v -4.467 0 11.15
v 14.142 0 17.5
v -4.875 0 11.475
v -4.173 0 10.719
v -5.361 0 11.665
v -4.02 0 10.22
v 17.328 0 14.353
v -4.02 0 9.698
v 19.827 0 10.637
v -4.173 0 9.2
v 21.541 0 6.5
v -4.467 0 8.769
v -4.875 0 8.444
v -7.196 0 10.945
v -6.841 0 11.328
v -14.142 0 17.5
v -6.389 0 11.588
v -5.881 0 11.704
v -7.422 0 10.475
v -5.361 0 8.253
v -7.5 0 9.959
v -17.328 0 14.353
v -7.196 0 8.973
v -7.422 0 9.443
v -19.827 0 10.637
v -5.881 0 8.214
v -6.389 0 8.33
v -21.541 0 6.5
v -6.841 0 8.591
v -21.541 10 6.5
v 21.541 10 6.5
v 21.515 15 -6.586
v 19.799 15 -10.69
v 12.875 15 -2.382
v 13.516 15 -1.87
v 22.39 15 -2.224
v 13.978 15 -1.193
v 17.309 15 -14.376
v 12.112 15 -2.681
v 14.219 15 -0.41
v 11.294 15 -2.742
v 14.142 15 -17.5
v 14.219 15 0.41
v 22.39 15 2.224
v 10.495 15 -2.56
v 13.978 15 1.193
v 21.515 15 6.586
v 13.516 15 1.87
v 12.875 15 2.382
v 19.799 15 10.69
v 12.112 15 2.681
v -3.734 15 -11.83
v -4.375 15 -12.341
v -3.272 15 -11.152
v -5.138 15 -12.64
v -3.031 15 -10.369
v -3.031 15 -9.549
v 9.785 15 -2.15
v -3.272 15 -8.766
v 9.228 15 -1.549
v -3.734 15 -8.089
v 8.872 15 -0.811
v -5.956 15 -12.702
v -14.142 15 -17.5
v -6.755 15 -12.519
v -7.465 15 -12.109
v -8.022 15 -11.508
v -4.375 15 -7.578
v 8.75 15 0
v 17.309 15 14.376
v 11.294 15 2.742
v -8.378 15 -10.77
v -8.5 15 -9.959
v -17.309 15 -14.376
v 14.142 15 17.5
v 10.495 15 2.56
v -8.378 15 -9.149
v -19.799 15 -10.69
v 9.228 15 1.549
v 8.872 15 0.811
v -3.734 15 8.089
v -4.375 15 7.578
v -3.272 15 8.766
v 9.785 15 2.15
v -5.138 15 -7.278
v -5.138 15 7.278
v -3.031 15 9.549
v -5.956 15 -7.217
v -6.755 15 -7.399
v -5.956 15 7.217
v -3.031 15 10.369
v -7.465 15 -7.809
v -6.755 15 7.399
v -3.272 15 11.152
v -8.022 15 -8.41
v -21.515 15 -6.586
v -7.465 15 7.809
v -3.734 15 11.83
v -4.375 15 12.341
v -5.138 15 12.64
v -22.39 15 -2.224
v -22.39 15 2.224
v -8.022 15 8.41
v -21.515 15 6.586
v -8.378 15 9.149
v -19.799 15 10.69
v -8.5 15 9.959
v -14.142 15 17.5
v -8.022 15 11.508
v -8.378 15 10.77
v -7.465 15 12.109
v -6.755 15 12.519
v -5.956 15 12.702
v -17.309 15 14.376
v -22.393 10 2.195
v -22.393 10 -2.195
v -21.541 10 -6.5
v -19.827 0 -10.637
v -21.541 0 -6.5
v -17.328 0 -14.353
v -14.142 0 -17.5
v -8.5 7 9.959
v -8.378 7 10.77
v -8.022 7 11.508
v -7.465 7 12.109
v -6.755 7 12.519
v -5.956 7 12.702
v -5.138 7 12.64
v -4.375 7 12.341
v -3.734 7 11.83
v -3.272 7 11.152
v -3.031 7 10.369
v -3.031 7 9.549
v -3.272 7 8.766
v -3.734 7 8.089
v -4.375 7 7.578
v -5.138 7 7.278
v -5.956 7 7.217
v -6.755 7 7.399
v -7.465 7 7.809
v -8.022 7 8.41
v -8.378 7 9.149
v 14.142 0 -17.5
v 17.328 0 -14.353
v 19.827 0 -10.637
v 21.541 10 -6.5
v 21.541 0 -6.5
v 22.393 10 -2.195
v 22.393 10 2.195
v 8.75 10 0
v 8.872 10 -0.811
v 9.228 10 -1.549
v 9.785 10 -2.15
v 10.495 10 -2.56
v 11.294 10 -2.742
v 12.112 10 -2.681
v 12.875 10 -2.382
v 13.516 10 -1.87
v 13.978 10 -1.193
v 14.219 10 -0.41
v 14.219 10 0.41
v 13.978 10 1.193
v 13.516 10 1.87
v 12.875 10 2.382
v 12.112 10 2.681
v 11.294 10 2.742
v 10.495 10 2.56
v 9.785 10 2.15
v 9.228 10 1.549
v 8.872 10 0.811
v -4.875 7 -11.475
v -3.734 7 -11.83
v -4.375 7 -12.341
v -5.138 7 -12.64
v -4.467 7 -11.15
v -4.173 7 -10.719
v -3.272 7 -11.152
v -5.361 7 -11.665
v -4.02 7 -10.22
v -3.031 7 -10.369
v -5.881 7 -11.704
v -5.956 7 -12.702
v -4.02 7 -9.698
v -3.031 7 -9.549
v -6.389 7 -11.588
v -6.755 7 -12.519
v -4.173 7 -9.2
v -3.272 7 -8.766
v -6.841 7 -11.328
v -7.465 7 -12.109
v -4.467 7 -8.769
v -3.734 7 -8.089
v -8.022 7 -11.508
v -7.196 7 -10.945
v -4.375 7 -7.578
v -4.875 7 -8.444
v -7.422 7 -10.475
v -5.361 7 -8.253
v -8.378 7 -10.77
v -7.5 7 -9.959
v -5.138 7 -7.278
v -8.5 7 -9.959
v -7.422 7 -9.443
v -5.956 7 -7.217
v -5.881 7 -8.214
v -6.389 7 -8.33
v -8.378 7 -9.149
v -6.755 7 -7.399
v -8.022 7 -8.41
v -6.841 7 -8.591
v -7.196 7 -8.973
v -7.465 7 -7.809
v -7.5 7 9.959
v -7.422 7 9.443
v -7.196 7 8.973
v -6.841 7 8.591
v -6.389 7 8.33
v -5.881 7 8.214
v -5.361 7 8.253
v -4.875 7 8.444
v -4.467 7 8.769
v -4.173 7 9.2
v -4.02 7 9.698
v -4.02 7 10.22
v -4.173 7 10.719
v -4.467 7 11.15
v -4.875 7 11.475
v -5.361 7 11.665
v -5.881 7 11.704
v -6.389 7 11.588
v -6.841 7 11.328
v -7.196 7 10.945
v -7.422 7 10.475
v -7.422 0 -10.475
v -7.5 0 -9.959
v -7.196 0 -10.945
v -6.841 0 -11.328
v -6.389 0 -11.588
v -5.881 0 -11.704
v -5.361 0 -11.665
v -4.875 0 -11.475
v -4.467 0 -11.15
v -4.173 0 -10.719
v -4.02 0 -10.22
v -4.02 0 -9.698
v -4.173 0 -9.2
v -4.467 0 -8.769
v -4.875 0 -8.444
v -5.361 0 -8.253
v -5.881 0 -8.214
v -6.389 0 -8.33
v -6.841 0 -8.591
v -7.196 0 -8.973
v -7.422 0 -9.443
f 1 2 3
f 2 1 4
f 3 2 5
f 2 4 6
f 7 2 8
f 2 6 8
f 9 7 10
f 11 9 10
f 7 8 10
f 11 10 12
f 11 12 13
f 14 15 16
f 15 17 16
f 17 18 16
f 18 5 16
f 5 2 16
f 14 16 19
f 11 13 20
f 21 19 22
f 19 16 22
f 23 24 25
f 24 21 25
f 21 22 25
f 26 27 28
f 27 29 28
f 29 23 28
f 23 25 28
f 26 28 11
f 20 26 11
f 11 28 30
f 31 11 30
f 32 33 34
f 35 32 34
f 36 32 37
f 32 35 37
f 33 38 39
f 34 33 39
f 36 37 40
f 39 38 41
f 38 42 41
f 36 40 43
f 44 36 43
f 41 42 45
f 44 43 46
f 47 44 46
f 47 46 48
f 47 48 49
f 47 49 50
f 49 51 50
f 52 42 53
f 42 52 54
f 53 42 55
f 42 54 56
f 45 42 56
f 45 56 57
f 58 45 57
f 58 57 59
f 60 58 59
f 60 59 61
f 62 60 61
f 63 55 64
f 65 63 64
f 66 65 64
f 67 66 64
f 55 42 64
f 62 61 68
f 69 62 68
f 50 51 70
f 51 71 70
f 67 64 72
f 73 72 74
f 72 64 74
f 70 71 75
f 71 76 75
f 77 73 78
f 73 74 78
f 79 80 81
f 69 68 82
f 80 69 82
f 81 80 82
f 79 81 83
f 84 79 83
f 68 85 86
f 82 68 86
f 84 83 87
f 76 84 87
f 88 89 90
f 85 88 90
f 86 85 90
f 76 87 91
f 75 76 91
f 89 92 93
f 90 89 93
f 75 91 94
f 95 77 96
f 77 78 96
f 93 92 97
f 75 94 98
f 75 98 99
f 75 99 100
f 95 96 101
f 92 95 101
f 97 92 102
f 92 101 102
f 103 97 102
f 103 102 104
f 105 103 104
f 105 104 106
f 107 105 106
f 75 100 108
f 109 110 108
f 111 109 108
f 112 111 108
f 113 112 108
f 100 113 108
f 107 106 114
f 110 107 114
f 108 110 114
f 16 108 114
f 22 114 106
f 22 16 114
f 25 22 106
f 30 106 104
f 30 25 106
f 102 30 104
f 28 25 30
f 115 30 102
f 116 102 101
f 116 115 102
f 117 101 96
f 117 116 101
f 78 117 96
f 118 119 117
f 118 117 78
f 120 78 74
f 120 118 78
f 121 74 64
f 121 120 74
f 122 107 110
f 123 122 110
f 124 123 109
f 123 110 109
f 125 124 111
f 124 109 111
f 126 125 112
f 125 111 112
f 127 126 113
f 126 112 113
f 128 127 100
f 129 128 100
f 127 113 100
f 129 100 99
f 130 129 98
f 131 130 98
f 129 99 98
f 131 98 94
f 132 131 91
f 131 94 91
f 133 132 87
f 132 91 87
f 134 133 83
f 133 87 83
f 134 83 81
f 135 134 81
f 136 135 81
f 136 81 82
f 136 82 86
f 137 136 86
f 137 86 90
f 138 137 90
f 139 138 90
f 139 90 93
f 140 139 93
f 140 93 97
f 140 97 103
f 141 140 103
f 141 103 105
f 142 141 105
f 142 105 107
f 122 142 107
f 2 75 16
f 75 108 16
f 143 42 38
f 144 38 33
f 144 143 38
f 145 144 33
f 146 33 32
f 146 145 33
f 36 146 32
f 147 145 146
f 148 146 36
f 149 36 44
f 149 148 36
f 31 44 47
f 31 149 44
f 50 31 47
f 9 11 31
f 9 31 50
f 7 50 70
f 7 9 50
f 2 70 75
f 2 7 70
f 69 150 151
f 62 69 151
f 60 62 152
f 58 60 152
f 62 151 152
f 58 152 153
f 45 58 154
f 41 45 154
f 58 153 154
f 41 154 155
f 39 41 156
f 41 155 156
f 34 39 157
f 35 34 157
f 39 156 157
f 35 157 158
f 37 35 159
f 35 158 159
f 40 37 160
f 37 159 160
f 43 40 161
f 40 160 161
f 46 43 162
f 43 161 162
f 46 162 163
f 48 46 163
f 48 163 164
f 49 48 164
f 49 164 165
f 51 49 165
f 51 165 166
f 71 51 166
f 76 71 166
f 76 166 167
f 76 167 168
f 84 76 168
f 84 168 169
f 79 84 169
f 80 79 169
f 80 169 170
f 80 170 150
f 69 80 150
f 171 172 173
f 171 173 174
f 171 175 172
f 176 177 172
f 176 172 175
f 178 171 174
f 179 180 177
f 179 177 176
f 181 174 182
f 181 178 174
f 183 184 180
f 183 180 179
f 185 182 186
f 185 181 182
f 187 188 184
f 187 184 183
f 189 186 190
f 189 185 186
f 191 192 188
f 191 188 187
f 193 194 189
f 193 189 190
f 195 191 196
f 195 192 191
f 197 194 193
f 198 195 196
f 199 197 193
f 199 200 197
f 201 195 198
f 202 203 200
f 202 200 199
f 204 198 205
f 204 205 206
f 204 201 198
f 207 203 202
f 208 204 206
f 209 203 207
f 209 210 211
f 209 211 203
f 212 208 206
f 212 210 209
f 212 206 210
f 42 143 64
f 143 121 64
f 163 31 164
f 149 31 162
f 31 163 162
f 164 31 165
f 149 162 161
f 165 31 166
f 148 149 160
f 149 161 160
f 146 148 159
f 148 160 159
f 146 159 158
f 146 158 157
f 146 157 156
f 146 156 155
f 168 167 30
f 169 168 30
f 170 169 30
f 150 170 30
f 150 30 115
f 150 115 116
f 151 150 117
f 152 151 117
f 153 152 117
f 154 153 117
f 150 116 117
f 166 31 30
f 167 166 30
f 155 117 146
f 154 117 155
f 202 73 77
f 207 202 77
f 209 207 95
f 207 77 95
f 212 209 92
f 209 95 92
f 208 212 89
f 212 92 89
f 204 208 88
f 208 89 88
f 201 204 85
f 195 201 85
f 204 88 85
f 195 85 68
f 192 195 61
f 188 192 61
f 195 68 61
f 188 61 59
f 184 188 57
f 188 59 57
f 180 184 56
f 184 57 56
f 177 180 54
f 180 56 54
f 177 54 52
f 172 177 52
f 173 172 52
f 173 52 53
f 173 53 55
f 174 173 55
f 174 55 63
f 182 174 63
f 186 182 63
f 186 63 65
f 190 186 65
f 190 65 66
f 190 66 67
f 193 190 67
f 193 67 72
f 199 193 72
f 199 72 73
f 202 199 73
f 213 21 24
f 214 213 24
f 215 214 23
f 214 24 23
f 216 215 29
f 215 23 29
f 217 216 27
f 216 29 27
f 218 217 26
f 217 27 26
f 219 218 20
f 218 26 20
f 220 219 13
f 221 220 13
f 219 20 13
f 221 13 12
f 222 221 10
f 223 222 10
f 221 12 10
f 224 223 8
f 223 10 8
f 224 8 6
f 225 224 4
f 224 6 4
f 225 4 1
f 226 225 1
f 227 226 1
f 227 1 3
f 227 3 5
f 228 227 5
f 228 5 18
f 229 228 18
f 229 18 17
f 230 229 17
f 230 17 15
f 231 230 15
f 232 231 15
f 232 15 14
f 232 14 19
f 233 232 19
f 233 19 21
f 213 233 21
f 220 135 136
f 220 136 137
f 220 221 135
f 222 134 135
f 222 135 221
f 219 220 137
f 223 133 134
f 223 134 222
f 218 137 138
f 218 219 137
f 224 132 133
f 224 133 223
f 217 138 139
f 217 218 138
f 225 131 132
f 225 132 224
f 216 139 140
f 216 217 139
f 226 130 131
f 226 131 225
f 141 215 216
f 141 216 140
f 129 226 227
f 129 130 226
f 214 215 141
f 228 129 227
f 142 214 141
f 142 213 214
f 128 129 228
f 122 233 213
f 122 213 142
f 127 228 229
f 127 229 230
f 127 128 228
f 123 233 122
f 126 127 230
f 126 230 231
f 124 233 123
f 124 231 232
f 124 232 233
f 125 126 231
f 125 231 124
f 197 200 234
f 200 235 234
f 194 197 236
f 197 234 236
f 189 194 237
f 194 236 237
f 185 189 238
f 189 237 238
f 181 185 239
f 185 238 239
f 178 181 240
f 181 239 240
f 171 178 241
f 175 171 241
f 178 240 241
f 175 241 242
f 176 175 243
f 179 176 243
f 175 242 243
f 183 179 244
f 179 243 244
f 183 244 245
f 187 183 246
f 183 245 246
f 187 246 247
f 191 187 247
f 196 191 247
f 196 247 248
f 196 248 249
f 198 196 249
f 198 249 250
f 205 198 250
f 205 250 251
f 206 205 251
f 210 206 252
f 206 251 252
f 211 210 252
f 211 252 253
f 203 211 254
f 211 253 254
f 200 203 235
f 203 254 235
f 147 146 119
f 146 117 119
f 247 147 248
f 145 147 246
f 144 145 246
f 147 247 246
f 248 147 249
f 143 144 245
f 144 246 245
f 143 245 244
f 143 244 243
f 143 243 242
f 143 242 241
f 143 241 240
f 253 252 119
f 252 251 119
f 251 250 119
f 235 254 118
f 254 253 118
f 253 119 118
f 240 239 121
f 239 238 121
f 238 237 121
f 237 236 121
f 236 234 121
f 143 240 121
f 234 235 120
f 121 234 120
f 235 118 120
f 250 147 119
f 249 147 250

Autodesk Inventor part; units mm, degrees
ref_plane "YZ Plane" through (0, 0, 0) normal (1, 0, 0) x (0, 1, 0)
ref_plane "XZ Plane" through (0, 0, 0) normal (0, 1, 0) x (-1, 0, 0)
ref_plane "XY Plane" through (0, 0, 0) normal (0, 0, 1) x (1, 0, 0)
sketch "Sketch1" plane through (0, 0, 0) normal (0, 1, 0) x (-1, 0, 0)
  circle A0 centre (0, 0) radius 11.5 construction
  line L0 (0, 0) -> (5.75, 9.9593) construction
  line L1 (0, 0) -> (5.75, -9.9593) construction
  line L2 (11.5, 0) -> (0, 0) construction
  circle A1 centre (5.75, 9.9593) radius 1.75
  circle A2 centre (5.75, -9.9593) radius 1.75
  circle A3 centre (0, 0) radius 22.5
  line L3 (14.1421, 17.5) -> (-14.1421, 17.5)
  line L4 (14.1421, -17.5) -> (-14.1421, -17.5)
  line L5 (-22.5, -22.5) -> (22.5, -22.5)
  line L6 (22.5, -22.5) -> (22.5, 22.5)
  line L7 (22.5, 22.5) -> (-22.5, 22.5)
  line L8 (-22.5, 22.5) -> (-22.5, -22.5)
  line L9 (-22.5, -22.5) -> (22.5, 22.5) construction
  line L10 (22.5, -22.5) -> (-22.5, 22.5) construction
  circle A4 centre (-11.5, 0) radius 2.75
  circle A5 centre (5.75, 9.9593) radius 2.75
  circle A6 centre (5.75, -9.9593) radius 2.75
  point P0 (-22.5, 0)
  point P1 (22.5, 0)
  dimension "d0" = 23
  dimension "d1" = 60
  dimension "d2" = 3.5
  dimension "d6" = 35
  dimension "d7" = 45
  dimension "d16" = 5.5
sketch "Sketch2" plane through (0, 0, 0) normal (1, 0, 0) x (0, 1, 0)
  line L0 (0, 17.5) -> (0, 6.5)
  line L1 (0, 6.5) -> (10, 6.5)
  line L2 (10, 6.5) -> (10, -6.5)
  line L3 (10, -6.5) -> (0, -6.5)
  line L4 (0, -6.5) -> (0, -17.5)
  line L5 (11, -17.5) -> (15, -17.5)
  line L6 (15, -17.5) -> (15, 17.5)
  line L7 (15, 17.5) -> (0, 17.5)
  line L8 (11, -17.5) -> (0, -17.5)
  line L9 (0, 0) -> (15, 0) construction
  point P0 (0, -17.5)
  dimension "d5" = 15
  dimension "d14" = 13
  dimension "d15" = 5
extrude "Extrusion1" add sketch "Sketch2" along normal mid plane 45
extrude "Extrusion2" cut sketch "Sketch1" along normal through all contours L6 L5 A3 | A3 L7 L6 | L3 A3 | A3 L4 | A3 L8 L7 | L5 L8 A3
extrude "Extrusion3" cut sketch "Sketch1" along normal through all contours A1 | A2
extrude "Extrusion4" cut sketch "Sketch1" along normal through all contours A4
extrude "Extrusion5" cut sketch "Sketch1" against normal blind 8 from surface at 15 contours A1 | A2 | A5 | A6
properties part number "back_hip_cable_protector"
